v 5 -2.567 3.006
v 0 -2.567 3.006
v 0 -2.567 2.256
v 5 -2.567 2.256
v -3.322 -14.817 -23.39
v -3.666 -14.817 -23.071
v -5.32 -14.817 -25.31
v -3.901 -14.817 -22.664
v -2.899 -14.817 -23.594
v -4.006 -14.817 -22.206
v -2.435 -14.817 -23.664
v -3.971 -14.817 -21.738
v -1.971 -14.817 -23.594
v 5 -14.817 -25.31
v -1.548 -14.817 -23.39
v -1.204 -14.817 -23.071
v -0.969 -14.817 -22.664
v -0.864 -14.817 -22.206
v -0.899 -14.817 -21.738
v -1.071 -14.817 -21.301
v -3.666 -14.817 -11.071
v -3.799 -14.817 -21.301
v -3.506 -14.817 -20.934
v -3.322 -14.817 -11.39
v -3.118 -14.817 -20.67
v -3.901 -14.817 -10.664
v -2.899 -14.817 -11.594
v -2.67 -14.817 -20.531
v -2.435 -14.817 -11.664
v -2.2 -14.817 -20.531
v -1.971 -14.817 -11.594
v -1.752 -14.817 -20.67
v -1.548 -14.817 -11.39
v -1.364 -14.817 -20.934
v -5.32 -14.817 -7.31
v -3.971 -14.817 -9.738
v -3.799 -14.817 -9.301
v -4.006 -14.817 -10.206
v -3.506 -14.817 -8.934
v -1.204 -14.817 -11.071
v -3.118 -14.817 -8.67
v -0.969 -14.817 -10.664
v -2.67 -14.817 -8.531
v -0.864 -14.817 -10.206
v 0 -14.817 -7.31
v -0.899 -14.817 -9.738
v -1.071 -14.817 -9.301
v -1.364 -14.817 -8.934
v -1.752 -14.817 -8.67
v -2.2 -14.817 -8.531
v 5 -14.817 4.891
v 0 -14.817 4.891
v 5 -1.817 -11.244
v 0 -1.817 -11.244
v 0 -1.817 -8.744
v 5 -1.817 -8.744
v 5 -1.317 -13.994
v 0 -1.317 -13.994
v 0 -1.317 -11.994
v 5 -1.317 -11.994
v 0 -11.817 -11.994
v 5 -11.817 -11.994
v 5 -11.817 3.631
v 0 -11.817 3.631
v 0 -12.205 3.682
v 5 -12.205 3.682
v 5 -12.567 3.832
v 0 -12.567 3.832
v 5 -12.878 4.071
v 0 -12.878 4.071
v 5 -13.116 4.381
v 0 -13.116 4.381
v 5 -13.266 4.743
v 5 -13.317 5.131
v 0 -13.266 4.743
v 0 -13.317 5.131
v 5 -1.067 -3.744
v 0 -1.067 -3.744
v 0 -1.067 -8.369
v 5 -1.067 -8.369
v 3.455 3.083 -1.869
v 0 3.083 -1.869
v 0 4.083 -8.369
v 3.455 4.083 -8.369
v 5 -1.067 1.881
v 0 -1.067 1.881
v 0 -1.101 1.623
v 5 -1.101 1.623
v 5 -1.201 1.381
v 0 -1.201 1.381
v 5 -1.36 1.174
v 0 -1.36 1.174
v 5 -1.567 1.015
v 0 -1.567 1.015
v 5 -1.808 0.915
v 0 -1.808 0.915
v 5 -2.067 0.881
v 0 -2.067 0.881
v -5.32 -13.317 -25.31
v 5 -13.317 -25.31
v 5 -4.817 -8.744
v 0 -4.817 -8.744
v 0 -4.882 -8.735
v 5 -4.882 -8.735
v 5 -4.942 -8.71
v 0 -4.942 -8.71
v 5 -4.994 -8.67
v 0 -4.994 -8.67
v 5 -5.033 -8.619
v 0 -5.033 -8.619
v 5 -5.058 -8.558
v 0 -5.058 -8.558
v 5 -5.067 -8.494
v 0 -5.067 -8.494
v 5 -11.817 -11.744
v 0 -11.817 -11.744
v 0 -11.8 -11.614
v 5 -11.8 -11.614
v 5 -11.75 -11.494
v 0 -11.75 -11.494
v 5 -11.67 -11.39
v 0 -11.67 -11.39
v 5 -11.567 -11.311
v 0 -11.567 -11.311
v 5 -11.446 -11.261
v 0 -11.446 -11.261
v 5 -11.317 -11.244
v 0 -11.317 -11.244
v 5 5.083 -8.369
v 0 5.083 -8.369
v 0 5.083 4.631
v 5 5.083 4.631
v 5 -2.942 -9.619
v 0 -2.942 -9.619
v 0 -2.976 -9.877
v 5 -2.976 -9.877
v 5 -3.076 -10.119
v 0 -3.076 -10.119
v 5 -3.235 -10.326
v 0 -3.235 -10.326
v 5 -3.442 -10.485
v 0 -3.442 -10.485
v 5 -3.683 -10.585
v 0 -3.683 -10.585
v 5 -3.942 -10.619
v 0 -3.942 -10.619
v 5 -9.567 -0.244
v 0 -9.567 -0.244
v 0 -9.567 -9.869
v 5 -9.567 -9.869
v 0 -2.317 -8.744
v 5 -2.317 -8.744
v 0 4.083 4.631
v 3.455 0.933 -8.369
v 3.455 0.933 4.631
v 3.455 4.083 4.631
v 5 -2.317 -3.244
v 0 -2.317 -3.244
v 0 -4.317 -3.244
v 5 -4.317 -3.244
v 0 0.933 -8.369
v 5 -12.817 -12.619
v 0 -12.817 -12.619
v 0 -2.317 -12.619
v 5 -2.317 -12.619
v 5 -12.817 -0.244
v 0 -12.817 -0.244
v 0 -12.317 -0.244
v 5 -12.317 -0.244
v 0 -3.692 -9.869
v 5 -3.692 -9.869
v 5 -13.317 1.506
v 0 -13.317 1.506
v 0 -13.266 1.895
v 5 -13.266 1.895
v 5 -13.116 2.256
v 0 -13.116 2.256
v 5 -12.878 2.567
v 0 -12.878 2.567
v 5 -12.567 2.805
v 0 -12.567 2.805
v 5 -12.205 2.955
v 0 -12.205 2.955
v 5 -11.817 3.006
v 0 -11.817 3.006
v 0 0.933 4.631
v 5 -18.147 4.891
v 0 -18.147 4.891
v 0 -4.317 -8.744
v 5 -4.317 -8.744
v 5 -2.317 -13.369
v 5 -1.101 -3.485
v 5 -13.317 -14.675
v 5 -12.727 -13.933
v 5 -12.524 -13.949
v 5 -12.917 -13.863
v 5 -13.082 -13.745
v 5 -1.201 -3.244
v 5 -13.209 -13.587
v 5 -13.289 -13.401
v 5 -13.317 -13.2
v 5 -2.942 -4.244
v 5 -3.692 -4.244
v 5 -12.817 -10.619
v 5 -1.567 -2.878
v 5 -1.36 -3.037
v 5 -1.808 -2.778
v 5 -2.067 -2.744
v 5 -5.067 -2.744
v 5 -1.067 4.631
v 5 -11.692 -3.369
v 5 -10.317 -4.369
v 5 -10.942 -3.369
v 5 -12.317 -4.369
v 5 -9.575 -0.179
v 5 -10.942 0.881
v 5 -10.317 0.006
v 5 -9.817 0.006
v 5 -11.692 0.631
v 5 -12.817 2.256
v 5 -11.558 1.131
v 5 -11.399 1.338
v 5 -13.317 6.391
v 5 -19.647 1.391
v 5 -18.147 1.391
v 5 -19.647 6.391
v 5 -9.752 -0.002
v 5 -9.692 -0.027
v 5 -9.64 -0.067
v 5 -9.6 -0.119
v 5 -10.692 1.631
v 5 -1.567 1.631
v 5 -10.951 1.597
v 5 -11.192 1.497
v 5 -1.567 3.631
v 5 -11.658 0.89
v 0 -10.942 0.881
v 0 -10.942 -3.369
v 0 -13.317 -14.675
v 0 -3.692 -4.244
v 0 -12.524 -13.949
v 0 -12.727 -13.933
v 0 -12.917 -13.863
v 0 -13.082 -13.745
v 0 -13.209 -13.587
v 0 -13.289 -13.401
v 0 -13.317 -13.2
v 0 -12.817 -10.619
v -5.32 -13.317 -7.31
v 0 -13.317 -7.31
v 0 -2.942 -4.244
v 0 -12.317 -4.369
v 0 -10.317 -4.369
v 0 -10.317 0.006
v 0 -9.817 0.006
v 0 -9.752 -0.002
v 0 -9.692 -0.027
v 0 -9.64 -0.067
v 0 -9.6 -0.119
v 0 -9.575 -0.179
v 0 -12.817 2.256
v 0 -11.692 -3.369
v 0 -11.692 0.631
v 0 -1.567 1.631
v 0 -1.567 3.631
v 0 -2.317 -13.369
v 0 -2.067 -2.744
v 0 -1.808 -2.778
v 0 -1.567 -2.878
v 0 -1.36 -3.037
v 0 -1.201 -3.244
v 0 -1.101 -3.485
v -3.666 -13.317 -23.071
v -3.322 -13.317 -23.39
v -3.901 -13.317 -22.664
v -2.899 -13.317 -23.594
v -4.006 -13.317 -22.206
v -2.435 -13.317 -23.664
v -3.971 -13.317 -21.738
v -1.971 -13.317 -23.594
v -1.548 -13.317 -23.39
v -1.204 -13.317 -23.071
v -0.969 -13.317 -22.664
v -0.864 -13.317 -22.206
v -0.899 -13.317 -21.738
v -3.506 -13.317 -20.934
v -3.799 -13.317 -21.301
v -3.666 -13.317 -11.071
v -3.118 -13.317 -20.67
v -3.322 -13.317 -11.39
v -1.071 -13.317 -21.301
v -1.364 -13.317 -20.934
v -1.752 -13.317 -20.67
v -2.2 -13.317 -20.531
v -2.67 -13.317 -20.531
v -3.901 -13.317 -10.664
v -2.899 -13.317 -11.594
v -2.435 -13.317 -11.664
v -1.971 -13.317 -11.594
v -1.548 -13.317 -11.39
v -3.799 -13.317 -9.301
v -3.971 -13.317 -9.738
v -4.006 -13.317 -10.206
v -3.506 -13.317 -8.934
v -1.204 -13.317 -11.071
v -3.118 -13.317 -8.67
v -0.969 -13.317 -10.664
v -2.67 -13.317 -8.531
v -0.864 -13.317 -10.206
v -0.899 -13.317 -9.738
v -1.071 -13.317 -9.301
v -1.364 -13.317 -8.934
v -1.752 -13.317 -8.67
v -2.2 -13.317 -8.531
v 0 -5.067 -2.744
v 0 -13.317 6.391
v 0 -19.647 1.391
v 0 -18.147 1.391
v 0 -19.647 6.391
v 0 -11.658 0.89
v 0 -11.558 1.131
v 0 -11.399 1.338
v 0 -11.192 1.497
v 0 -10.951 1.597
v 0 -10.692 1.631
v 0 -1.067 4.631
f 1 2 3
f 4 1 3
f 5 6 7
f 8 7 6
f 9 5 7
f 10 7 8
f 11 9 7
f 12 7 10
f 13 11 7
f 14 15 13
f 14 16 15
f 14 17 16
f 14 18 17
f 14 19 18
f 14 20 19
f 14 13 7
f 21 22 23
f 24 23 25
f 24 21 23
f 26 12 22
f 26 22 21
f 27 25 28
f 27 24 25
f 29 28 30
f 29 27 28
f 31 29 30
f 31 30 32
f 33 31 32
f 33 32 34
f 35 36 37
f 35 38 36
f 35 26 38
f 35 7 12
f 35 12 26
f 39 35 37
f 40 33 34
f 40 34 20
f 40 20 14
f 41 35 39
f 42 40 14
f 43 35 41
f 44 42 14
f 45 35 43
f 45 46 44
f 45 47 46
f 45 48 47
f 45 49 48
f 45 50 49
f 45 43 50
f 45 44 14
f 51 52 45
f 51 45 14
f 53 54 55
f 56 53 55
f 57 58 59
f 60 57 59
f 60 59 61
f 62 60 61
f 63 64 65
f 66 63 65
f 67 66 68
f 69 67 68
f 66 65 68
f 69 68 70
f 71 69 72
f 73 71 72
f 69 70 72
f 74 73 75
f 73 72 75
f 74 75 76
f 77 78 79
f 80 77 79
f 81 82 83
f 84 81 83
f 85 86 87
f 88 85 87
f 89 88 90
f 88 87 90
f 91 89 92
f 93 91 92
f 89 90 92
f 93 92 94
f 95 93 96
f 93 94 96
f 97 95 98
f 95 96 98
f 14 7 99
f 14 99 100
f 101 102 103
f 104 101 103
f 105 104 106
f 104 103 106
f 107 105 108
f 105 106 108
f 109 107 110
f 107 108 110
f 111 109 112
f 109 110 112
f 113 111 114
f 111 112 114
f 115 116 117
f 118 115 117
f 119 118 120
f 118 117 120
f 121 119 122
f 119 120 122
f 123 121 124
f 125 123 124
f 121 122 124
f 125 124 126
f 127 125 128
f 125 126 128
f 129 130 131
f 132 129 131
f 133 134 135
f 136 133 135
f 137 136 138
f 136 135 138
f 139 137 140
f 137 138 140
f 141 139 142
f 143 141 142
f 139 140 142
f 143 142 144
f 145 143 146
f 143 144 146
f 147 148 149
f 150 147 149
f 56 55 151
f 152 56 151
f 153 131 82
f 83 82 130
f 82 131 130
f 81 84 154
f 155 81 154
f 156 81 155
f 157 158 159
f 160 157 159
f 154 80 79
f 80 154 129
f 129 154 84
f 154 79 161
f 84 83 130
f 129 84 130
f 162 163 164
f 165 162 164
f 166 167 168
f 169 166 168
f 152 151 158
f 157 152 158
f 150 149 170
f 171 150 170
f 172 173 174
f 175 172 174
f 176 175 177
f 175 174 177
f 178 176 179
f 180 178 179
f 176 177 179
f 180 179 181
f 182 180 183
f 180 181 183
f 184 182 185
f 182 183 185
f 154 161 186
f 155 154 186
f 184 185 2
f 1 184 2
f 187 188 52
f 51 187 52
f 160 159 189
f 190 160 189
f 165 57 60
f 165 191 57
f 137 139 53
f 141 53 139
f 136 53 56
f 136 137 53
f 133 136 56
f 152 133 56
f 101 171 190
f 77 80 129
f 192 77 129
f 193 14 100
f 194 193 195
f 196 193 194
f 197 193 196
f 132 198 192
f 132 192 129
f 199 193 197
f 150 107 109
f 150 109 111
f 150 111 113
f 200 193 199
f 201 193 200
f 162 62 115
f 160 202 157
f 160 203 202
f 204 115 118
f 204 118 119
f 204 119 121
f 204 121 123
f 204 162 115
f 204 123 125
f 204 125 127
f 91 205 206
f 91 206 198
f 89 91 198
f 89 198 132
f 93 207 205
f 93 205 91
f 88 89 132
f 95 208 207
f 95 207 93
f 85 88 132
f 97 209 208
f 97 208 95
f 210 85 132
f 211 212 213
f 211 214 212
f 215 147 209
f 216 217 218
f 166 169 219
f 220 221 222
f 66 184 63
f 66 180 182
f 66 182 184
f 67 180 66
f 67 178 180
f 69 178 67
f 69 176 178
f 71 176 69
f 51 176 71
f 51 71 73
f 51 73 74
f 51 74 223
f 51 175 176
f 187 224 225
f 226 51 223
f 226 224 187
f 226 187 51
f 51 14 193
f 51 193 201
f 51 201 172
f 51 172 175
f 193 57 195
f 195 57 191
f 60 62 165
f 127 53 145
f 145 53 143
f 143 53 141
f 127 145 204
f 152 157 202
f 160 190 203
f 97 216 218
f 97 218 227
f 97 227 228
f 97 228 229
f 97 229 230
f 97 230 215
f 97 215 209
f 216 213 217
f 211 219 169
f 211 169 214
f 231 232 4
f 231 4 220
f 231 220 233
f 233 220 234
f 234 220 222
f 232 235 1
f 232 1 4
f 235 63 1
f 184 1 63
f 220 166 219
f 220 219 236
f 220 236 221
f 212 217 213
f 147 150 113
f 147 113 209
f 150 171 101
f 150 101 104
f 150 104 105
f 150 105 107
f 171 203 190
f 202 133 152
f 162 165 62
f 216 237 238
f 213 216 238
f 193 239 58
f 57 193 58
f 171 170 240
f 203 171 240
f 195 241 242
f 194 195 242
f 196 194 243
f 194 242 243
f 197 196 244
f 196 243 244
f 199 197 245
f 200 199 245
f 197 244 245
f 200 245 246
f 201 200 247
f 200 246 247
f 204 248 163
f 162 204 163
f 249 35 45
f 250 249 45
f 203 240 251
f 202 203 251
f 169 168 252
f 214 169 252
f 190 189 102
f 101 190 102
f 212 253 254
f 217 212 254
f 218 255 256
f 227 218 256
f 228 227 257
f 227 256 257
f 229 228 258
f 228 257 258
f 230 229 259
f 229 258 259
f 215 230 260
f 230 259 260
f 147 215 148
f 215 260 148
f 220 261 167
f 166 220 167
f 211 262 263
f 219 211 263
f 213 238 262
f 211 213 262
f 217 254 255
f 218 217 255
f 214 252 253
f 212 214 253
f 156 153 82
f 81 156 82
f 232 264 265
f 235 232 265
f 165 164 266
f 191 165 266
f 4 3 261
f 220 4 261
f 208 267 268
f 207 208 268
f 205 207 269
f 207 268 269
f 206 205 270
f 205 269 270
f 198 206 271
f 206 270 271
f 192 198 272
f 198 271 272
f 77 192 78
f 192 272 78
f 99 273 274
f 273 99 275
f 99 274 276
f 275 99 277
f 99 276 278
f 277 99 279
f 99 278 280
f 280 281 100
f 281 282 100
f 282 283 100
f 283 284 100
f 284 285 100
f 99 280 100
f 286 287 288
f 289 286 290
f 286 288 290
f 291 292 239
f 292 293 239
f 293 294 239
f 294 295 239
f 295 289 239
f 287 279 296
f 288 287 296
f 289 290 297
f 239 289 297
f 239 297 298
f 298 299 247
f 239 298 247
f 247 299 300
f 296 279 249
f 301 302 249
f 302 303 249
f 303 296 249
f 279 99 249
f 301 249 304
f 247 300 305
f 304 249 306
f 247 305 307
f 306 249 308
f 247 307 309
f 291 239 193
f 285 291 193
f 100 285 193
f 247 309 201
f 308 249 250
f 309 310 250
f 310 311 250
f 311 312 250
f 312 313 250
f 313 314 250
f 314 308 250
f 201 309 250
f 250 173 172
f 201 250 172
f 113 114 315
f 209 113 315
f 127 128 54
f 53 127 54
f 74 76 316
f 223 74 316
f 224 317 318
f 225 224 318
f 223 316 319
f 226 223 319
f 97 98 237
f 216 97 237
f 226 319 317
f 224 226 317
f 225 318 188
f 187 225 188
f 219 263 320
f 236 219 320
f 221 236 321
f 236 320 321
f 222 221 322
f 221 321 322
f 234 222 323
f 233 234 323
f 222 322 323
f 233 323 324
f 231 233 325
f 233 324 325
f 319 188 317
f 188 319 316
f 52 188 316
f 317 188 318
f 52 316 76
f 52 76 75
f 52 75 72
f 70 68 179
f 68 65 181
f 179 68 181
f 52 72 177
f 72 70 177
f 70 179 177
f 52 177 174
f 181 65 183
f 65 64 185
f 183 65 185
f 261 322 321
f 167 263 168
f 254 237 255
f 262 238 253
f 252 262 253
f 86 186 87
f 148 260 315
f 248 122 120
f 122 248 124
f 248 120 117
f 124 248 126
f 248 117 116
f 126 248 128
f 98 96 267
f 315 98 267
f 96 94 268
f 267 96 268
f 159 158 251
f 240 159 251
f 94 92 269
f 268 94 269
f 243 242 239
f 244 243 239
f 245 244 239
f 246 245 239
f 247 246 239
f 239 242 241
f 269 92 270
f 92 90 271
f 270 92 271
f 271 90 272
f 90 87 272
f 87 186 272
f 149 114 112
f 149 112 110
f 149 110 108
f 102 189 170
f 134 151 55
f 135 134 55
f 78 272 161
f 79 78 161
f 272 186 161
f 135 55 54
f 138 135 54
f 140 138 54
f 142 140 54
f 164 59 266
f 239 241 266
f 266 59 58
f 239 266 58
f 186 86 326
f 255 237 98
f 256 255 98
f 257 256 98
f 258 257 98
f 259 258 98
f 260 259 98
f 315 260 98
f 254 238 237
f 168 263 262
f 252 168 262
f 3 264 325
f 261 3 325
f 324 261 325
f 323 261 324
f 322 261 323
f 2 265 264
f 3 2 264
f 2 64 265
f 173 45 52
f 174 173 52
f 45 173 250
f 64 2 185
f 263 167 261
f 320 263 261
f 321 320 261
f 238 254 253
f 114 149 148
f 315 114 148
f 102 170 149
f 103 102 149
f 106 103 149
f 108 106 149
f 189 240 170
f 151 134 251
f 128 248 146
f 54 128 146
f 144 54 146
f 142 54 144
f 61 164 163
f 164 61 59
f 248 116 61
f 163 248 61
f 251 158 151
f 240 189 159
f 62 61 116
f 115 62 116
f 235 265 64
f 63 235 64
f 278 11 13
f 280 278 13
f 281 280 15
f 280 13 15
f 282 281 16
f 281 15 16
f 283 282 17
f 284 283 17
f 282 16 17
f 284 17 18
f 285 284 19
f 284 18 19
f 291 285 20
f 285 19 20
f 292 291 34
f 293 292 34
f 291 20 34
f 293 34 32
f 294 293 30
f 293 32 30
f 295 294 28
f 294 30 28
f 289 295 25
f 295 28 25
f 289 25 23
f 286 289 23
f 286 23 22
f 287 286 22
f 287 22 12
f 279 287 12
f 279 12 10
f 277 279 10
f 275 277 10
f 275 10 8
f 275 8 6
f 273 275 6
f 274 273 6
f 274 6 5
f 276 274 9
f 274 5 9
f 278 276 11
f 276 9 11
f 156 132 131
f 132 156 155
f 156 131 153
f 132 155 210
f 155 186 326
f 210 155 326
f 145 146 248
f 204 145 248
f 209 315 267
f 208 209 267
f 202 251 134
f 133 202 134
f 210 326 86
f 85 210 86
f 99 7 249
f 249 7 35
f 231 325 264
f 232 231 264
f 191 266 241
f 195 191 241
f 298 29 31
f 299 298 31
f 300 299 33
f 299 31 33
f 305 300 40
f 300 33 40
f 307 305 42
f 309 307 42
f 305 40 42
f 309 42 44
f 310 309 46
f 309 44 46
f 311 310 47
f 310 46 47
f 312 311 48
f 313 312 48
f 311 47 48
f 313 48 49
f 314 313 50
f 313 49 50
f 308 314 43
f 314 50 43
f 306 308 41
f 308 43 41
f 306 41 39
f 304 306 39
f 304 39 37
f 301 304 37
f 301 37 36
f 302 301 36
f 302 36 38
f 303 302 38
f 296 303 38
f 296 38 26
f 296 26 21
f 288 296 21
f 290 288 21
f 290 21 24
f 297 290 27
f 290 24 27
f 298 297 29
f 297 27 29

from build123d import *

# Parameters (mm, degrees)
FLEXURE_BOSS_DEPTH            = 5
SKETCH2_W                     = 10.32
SKETCH2_H                     = 18
SKETCH2_R                     = 1.575
MOUNTING_PLATE_BOSS_DEPTH     = 1.5
DOVETAIL_CONNECTION_CUT_DEPTH = 3.455


with BuildPart() as part:
    # Sketch1 → Flexure Boss (new body)
    with BuildSketch(Plane(origin=(0, 0, 0), x_dir=(0, 0, -1), z_dir=(1, 0, 0))):
        with BuildLine():
            Line((3.743651747, -1.066915143), (8.368651984, -1.066915143))
            Line((8.368651984, -1.066915143), (8.368651984, 5.083084857))
            Line((8.368651984, 5.083084857), (-4.631348016, 5.083084857))
            Line((-4.631348016, 5.083084857), (-4.631348016, -1.066915143))
            Line((-4.631348016, -1.066915143), (-1.881348253, -1.066915143))
            ThreePointArc((-1.881348253, -1.066915143), (-1.174241471, -1.359808362), (-0.881348253, -2.066915143))
            Line((-0.881348253, -2.066915143), (-0.881348253, -10.941915143))
            Line((-0.881348253, -10.941915143), (3.368651984, -10.941915143))
            Line((3.368651984, -10.941915143), (3.368651984, -11.691915143))
            Line((3.368651984, -11.691915143), (-0.631348016, -11.691915143))
            ThreePointArc((-0.631348016, -11.691915143), (-1.338454797, -11.399021924), (-1.631348016, -10.691915143))
            Line((-1.631348016, -10.691915143), (-1.631348016, -1.566915143))
            Line((-1.631348016, -1.566915143), (-3.631348016, -1.566915143))
            Line((-3.631348016, -1.566915143), (-3.631348016, -11.816915143))
            ThreePointArc((-3.631348016, -11.816915143), (-4.070687844, -12.877575315), (-5.131348016, -13.316915143))
            Line((-5.131348016, -13.316915143), (-6.391348016, -13.316915143))
            Line((-6.391348016, -13.316915143), (-6.391348016, -19.646915143))
            Line((-6.391348016, -19.646915143), (-1.391348016, -19.646915143))
            Line((-1.391348016, -19.646915143), (-1.391348016, -18.146915143))
            Line((-1.391348016, -18.146915143), (-4.891348016, -18.146915143))
            Line((-4.891348016, -18.146915143), (-4.891348016, -14.816915143))
            Line((-4.891348016, -14.816915143), (-4.631348016, -14.816915143))
            Line((-4.631348016, -14.816915143), (14.675469929, -14.816915143))
            Line((14.675469929, -14.816915143), (14.675469929, -13.316915143))
            Line((14.675469929, -13.316915143), (13.993651747, -1.316915143))
            Line((13.993651747, -1.316915143), (11.993651747, -1.316915143))
            Line((11.993651747, -1.316915143), (11.993651747, -11.816915143))
            Line((11.993651747, -11.816915143), (11.743651747, -11.816915143))
            ThreePointArc((11.743651747, -11.816915143), (11.390098357, -11.670468534), (11.243651747, -11.316915143))
            Line((11.243651747, -11.316915143), (11.243651747, -1.816915143))
            Line((11.243651747, -1.816915143), (8.743651747, -1.816915143))
            Line((8.743651747, -1.816915143), (8.743651747, -2.316915143))
            Line((8.743651747, -2.316915143), (3.243651747, -2.316915143))
            Line((3.243651747, -2.316915143), (3.243651747, -4.316915143))
            Line((3.243651747, -4.316915143), (8.743651747, -4.316915143))
            Line((8.743651747, -4.316915143), (8.743651747, -4.816915143))
            ThreePointArc((8.743651747, -4.816915143), (8.670428443, -4.993691838), (8.493651747, -5.066915143))
            Line((8.493651747, -5.066915143), (2.743651747, -5.066915143))
            Line((2.743651747, -5.066915143), (2.743651747, -2.066915143))
            ThreePointArc((2.743651747, -2.066915143), (3.036544966, -1.359808362), (3.743651747, -1.066915143))
        make_face()
        with BuildLine():
            Line((0.243651747, -9.566915143), (9.868651747, -9.566915143))
            Line((9.868651747, -9.566915143), (9.868651747, -3.691915143))
            Line((9.868651747, -3.691915143), (4.243651747, -3.691915143))
            Line((4.243651747, -3.691915143), (4.243651747, -2.941915143))
            Line((4.243651747, -2.941915143), (9.618651747, -2.941915143))
            ThreePointArc((9.618651747, -2.941915143), (10.325758529, -3.234808362), (10.618651747, -3.941915143))
            Line((10.618651747, -3.941915143), (10.618651747, -12.816915143))
            Line((10.618651747, -12.816915143), (12.618651747, -12.816915143))
            Line((12.618651747, -12.816915143), (12.618651747, -2.316915143))
            Line((12.618651747, -2.316915143), (13.368651747, -2.316915143))
            Line((13.368651747, -2.316915143), (13.948620781, -12.524370125))
            ThreePointArc((13.948620781, -12.524370125), (13.744993017, -13.0819837), (13.199828472, -13.316915143))
            Line((13.199828472, -13.316915143), (-1.506348016, -13.316915143))
            ThreePointArc((-1.506348016, -13.316915143), (-2.567008187, -12.877575315), (-3.006348016, -11.816915143))
            Line((-3.006348016, -11.816915143), (-3.006348016, -2.566915143))
            Line((-3.006348016, -2.566915143), (-2.256348016, -2.566915143))
            Line((-2.256348016, -2.566915143), (-2.256348016, -12.816915143))
            Line((-2.256348016, -12.816915143), (0.243651984, -12.816915143))
            Line((0.243651984, -12.816915143), (0.243651984, -12.316915143))
            Line((0.243651984, -12.316915143), (4.368651984, -12.316915143))
            Line((4.368651984, -12.316915143), (4.368651984, -10.316915143))
            Line((4.368651984, -10.316915143), (-0.006348253, -10.316915143))
            Line((-0.006348253, -10.316915143), (-0.006348253, -9.816915143))
            ThreePointArc((-0.006348253, -9.816915143), (0.066875052, -9.640138448), (0.243651747, -9.566915143))
        make_face(mode=Mode.SUBTRACT)
    extrude(amount=FLEXURE_BOSS_DEPTH)

    # Sketch2 → Mounting Plate Boss (add)
    with BuildSketch(Plane.XZ.offset(14.816915143)):
        with Locations((-0.16, -16.309568548)):
            Rectangle(SKETCH2_W, SKETCH2_H)
        with Locations(Location((-2.435, -10.088651984, 0), (0, 0, 270))):
            Circle(SKETCH2_R, mode=Mode.SUBTRACT)
        with Locations(Location((-2.435, -22.088651984, 0), (0, 0, 270))):
            Circle(SKETCH2_R, mode=Mode.SUBTRACT)
    extrude(amount=-MOUNTING_PLATE_BOSS_DEPTH)

    # Sketch7 → Dovetail Connection Cut (cut)
    with BuildSketch(Plane.ZY):
        Polygon((-8.368651984, 0.933084857), (4.631348016, 0.933084857), (4.631348016, 4.083084857), (-1.868651984, 3.083084857), (-8.368651984, 4.083084857), align=None)
    extrude(amount=-DOVETAIL_CONNECTION_CUT_DEPTH, mode=Mode.SUBTRACT)


solid = part.part
